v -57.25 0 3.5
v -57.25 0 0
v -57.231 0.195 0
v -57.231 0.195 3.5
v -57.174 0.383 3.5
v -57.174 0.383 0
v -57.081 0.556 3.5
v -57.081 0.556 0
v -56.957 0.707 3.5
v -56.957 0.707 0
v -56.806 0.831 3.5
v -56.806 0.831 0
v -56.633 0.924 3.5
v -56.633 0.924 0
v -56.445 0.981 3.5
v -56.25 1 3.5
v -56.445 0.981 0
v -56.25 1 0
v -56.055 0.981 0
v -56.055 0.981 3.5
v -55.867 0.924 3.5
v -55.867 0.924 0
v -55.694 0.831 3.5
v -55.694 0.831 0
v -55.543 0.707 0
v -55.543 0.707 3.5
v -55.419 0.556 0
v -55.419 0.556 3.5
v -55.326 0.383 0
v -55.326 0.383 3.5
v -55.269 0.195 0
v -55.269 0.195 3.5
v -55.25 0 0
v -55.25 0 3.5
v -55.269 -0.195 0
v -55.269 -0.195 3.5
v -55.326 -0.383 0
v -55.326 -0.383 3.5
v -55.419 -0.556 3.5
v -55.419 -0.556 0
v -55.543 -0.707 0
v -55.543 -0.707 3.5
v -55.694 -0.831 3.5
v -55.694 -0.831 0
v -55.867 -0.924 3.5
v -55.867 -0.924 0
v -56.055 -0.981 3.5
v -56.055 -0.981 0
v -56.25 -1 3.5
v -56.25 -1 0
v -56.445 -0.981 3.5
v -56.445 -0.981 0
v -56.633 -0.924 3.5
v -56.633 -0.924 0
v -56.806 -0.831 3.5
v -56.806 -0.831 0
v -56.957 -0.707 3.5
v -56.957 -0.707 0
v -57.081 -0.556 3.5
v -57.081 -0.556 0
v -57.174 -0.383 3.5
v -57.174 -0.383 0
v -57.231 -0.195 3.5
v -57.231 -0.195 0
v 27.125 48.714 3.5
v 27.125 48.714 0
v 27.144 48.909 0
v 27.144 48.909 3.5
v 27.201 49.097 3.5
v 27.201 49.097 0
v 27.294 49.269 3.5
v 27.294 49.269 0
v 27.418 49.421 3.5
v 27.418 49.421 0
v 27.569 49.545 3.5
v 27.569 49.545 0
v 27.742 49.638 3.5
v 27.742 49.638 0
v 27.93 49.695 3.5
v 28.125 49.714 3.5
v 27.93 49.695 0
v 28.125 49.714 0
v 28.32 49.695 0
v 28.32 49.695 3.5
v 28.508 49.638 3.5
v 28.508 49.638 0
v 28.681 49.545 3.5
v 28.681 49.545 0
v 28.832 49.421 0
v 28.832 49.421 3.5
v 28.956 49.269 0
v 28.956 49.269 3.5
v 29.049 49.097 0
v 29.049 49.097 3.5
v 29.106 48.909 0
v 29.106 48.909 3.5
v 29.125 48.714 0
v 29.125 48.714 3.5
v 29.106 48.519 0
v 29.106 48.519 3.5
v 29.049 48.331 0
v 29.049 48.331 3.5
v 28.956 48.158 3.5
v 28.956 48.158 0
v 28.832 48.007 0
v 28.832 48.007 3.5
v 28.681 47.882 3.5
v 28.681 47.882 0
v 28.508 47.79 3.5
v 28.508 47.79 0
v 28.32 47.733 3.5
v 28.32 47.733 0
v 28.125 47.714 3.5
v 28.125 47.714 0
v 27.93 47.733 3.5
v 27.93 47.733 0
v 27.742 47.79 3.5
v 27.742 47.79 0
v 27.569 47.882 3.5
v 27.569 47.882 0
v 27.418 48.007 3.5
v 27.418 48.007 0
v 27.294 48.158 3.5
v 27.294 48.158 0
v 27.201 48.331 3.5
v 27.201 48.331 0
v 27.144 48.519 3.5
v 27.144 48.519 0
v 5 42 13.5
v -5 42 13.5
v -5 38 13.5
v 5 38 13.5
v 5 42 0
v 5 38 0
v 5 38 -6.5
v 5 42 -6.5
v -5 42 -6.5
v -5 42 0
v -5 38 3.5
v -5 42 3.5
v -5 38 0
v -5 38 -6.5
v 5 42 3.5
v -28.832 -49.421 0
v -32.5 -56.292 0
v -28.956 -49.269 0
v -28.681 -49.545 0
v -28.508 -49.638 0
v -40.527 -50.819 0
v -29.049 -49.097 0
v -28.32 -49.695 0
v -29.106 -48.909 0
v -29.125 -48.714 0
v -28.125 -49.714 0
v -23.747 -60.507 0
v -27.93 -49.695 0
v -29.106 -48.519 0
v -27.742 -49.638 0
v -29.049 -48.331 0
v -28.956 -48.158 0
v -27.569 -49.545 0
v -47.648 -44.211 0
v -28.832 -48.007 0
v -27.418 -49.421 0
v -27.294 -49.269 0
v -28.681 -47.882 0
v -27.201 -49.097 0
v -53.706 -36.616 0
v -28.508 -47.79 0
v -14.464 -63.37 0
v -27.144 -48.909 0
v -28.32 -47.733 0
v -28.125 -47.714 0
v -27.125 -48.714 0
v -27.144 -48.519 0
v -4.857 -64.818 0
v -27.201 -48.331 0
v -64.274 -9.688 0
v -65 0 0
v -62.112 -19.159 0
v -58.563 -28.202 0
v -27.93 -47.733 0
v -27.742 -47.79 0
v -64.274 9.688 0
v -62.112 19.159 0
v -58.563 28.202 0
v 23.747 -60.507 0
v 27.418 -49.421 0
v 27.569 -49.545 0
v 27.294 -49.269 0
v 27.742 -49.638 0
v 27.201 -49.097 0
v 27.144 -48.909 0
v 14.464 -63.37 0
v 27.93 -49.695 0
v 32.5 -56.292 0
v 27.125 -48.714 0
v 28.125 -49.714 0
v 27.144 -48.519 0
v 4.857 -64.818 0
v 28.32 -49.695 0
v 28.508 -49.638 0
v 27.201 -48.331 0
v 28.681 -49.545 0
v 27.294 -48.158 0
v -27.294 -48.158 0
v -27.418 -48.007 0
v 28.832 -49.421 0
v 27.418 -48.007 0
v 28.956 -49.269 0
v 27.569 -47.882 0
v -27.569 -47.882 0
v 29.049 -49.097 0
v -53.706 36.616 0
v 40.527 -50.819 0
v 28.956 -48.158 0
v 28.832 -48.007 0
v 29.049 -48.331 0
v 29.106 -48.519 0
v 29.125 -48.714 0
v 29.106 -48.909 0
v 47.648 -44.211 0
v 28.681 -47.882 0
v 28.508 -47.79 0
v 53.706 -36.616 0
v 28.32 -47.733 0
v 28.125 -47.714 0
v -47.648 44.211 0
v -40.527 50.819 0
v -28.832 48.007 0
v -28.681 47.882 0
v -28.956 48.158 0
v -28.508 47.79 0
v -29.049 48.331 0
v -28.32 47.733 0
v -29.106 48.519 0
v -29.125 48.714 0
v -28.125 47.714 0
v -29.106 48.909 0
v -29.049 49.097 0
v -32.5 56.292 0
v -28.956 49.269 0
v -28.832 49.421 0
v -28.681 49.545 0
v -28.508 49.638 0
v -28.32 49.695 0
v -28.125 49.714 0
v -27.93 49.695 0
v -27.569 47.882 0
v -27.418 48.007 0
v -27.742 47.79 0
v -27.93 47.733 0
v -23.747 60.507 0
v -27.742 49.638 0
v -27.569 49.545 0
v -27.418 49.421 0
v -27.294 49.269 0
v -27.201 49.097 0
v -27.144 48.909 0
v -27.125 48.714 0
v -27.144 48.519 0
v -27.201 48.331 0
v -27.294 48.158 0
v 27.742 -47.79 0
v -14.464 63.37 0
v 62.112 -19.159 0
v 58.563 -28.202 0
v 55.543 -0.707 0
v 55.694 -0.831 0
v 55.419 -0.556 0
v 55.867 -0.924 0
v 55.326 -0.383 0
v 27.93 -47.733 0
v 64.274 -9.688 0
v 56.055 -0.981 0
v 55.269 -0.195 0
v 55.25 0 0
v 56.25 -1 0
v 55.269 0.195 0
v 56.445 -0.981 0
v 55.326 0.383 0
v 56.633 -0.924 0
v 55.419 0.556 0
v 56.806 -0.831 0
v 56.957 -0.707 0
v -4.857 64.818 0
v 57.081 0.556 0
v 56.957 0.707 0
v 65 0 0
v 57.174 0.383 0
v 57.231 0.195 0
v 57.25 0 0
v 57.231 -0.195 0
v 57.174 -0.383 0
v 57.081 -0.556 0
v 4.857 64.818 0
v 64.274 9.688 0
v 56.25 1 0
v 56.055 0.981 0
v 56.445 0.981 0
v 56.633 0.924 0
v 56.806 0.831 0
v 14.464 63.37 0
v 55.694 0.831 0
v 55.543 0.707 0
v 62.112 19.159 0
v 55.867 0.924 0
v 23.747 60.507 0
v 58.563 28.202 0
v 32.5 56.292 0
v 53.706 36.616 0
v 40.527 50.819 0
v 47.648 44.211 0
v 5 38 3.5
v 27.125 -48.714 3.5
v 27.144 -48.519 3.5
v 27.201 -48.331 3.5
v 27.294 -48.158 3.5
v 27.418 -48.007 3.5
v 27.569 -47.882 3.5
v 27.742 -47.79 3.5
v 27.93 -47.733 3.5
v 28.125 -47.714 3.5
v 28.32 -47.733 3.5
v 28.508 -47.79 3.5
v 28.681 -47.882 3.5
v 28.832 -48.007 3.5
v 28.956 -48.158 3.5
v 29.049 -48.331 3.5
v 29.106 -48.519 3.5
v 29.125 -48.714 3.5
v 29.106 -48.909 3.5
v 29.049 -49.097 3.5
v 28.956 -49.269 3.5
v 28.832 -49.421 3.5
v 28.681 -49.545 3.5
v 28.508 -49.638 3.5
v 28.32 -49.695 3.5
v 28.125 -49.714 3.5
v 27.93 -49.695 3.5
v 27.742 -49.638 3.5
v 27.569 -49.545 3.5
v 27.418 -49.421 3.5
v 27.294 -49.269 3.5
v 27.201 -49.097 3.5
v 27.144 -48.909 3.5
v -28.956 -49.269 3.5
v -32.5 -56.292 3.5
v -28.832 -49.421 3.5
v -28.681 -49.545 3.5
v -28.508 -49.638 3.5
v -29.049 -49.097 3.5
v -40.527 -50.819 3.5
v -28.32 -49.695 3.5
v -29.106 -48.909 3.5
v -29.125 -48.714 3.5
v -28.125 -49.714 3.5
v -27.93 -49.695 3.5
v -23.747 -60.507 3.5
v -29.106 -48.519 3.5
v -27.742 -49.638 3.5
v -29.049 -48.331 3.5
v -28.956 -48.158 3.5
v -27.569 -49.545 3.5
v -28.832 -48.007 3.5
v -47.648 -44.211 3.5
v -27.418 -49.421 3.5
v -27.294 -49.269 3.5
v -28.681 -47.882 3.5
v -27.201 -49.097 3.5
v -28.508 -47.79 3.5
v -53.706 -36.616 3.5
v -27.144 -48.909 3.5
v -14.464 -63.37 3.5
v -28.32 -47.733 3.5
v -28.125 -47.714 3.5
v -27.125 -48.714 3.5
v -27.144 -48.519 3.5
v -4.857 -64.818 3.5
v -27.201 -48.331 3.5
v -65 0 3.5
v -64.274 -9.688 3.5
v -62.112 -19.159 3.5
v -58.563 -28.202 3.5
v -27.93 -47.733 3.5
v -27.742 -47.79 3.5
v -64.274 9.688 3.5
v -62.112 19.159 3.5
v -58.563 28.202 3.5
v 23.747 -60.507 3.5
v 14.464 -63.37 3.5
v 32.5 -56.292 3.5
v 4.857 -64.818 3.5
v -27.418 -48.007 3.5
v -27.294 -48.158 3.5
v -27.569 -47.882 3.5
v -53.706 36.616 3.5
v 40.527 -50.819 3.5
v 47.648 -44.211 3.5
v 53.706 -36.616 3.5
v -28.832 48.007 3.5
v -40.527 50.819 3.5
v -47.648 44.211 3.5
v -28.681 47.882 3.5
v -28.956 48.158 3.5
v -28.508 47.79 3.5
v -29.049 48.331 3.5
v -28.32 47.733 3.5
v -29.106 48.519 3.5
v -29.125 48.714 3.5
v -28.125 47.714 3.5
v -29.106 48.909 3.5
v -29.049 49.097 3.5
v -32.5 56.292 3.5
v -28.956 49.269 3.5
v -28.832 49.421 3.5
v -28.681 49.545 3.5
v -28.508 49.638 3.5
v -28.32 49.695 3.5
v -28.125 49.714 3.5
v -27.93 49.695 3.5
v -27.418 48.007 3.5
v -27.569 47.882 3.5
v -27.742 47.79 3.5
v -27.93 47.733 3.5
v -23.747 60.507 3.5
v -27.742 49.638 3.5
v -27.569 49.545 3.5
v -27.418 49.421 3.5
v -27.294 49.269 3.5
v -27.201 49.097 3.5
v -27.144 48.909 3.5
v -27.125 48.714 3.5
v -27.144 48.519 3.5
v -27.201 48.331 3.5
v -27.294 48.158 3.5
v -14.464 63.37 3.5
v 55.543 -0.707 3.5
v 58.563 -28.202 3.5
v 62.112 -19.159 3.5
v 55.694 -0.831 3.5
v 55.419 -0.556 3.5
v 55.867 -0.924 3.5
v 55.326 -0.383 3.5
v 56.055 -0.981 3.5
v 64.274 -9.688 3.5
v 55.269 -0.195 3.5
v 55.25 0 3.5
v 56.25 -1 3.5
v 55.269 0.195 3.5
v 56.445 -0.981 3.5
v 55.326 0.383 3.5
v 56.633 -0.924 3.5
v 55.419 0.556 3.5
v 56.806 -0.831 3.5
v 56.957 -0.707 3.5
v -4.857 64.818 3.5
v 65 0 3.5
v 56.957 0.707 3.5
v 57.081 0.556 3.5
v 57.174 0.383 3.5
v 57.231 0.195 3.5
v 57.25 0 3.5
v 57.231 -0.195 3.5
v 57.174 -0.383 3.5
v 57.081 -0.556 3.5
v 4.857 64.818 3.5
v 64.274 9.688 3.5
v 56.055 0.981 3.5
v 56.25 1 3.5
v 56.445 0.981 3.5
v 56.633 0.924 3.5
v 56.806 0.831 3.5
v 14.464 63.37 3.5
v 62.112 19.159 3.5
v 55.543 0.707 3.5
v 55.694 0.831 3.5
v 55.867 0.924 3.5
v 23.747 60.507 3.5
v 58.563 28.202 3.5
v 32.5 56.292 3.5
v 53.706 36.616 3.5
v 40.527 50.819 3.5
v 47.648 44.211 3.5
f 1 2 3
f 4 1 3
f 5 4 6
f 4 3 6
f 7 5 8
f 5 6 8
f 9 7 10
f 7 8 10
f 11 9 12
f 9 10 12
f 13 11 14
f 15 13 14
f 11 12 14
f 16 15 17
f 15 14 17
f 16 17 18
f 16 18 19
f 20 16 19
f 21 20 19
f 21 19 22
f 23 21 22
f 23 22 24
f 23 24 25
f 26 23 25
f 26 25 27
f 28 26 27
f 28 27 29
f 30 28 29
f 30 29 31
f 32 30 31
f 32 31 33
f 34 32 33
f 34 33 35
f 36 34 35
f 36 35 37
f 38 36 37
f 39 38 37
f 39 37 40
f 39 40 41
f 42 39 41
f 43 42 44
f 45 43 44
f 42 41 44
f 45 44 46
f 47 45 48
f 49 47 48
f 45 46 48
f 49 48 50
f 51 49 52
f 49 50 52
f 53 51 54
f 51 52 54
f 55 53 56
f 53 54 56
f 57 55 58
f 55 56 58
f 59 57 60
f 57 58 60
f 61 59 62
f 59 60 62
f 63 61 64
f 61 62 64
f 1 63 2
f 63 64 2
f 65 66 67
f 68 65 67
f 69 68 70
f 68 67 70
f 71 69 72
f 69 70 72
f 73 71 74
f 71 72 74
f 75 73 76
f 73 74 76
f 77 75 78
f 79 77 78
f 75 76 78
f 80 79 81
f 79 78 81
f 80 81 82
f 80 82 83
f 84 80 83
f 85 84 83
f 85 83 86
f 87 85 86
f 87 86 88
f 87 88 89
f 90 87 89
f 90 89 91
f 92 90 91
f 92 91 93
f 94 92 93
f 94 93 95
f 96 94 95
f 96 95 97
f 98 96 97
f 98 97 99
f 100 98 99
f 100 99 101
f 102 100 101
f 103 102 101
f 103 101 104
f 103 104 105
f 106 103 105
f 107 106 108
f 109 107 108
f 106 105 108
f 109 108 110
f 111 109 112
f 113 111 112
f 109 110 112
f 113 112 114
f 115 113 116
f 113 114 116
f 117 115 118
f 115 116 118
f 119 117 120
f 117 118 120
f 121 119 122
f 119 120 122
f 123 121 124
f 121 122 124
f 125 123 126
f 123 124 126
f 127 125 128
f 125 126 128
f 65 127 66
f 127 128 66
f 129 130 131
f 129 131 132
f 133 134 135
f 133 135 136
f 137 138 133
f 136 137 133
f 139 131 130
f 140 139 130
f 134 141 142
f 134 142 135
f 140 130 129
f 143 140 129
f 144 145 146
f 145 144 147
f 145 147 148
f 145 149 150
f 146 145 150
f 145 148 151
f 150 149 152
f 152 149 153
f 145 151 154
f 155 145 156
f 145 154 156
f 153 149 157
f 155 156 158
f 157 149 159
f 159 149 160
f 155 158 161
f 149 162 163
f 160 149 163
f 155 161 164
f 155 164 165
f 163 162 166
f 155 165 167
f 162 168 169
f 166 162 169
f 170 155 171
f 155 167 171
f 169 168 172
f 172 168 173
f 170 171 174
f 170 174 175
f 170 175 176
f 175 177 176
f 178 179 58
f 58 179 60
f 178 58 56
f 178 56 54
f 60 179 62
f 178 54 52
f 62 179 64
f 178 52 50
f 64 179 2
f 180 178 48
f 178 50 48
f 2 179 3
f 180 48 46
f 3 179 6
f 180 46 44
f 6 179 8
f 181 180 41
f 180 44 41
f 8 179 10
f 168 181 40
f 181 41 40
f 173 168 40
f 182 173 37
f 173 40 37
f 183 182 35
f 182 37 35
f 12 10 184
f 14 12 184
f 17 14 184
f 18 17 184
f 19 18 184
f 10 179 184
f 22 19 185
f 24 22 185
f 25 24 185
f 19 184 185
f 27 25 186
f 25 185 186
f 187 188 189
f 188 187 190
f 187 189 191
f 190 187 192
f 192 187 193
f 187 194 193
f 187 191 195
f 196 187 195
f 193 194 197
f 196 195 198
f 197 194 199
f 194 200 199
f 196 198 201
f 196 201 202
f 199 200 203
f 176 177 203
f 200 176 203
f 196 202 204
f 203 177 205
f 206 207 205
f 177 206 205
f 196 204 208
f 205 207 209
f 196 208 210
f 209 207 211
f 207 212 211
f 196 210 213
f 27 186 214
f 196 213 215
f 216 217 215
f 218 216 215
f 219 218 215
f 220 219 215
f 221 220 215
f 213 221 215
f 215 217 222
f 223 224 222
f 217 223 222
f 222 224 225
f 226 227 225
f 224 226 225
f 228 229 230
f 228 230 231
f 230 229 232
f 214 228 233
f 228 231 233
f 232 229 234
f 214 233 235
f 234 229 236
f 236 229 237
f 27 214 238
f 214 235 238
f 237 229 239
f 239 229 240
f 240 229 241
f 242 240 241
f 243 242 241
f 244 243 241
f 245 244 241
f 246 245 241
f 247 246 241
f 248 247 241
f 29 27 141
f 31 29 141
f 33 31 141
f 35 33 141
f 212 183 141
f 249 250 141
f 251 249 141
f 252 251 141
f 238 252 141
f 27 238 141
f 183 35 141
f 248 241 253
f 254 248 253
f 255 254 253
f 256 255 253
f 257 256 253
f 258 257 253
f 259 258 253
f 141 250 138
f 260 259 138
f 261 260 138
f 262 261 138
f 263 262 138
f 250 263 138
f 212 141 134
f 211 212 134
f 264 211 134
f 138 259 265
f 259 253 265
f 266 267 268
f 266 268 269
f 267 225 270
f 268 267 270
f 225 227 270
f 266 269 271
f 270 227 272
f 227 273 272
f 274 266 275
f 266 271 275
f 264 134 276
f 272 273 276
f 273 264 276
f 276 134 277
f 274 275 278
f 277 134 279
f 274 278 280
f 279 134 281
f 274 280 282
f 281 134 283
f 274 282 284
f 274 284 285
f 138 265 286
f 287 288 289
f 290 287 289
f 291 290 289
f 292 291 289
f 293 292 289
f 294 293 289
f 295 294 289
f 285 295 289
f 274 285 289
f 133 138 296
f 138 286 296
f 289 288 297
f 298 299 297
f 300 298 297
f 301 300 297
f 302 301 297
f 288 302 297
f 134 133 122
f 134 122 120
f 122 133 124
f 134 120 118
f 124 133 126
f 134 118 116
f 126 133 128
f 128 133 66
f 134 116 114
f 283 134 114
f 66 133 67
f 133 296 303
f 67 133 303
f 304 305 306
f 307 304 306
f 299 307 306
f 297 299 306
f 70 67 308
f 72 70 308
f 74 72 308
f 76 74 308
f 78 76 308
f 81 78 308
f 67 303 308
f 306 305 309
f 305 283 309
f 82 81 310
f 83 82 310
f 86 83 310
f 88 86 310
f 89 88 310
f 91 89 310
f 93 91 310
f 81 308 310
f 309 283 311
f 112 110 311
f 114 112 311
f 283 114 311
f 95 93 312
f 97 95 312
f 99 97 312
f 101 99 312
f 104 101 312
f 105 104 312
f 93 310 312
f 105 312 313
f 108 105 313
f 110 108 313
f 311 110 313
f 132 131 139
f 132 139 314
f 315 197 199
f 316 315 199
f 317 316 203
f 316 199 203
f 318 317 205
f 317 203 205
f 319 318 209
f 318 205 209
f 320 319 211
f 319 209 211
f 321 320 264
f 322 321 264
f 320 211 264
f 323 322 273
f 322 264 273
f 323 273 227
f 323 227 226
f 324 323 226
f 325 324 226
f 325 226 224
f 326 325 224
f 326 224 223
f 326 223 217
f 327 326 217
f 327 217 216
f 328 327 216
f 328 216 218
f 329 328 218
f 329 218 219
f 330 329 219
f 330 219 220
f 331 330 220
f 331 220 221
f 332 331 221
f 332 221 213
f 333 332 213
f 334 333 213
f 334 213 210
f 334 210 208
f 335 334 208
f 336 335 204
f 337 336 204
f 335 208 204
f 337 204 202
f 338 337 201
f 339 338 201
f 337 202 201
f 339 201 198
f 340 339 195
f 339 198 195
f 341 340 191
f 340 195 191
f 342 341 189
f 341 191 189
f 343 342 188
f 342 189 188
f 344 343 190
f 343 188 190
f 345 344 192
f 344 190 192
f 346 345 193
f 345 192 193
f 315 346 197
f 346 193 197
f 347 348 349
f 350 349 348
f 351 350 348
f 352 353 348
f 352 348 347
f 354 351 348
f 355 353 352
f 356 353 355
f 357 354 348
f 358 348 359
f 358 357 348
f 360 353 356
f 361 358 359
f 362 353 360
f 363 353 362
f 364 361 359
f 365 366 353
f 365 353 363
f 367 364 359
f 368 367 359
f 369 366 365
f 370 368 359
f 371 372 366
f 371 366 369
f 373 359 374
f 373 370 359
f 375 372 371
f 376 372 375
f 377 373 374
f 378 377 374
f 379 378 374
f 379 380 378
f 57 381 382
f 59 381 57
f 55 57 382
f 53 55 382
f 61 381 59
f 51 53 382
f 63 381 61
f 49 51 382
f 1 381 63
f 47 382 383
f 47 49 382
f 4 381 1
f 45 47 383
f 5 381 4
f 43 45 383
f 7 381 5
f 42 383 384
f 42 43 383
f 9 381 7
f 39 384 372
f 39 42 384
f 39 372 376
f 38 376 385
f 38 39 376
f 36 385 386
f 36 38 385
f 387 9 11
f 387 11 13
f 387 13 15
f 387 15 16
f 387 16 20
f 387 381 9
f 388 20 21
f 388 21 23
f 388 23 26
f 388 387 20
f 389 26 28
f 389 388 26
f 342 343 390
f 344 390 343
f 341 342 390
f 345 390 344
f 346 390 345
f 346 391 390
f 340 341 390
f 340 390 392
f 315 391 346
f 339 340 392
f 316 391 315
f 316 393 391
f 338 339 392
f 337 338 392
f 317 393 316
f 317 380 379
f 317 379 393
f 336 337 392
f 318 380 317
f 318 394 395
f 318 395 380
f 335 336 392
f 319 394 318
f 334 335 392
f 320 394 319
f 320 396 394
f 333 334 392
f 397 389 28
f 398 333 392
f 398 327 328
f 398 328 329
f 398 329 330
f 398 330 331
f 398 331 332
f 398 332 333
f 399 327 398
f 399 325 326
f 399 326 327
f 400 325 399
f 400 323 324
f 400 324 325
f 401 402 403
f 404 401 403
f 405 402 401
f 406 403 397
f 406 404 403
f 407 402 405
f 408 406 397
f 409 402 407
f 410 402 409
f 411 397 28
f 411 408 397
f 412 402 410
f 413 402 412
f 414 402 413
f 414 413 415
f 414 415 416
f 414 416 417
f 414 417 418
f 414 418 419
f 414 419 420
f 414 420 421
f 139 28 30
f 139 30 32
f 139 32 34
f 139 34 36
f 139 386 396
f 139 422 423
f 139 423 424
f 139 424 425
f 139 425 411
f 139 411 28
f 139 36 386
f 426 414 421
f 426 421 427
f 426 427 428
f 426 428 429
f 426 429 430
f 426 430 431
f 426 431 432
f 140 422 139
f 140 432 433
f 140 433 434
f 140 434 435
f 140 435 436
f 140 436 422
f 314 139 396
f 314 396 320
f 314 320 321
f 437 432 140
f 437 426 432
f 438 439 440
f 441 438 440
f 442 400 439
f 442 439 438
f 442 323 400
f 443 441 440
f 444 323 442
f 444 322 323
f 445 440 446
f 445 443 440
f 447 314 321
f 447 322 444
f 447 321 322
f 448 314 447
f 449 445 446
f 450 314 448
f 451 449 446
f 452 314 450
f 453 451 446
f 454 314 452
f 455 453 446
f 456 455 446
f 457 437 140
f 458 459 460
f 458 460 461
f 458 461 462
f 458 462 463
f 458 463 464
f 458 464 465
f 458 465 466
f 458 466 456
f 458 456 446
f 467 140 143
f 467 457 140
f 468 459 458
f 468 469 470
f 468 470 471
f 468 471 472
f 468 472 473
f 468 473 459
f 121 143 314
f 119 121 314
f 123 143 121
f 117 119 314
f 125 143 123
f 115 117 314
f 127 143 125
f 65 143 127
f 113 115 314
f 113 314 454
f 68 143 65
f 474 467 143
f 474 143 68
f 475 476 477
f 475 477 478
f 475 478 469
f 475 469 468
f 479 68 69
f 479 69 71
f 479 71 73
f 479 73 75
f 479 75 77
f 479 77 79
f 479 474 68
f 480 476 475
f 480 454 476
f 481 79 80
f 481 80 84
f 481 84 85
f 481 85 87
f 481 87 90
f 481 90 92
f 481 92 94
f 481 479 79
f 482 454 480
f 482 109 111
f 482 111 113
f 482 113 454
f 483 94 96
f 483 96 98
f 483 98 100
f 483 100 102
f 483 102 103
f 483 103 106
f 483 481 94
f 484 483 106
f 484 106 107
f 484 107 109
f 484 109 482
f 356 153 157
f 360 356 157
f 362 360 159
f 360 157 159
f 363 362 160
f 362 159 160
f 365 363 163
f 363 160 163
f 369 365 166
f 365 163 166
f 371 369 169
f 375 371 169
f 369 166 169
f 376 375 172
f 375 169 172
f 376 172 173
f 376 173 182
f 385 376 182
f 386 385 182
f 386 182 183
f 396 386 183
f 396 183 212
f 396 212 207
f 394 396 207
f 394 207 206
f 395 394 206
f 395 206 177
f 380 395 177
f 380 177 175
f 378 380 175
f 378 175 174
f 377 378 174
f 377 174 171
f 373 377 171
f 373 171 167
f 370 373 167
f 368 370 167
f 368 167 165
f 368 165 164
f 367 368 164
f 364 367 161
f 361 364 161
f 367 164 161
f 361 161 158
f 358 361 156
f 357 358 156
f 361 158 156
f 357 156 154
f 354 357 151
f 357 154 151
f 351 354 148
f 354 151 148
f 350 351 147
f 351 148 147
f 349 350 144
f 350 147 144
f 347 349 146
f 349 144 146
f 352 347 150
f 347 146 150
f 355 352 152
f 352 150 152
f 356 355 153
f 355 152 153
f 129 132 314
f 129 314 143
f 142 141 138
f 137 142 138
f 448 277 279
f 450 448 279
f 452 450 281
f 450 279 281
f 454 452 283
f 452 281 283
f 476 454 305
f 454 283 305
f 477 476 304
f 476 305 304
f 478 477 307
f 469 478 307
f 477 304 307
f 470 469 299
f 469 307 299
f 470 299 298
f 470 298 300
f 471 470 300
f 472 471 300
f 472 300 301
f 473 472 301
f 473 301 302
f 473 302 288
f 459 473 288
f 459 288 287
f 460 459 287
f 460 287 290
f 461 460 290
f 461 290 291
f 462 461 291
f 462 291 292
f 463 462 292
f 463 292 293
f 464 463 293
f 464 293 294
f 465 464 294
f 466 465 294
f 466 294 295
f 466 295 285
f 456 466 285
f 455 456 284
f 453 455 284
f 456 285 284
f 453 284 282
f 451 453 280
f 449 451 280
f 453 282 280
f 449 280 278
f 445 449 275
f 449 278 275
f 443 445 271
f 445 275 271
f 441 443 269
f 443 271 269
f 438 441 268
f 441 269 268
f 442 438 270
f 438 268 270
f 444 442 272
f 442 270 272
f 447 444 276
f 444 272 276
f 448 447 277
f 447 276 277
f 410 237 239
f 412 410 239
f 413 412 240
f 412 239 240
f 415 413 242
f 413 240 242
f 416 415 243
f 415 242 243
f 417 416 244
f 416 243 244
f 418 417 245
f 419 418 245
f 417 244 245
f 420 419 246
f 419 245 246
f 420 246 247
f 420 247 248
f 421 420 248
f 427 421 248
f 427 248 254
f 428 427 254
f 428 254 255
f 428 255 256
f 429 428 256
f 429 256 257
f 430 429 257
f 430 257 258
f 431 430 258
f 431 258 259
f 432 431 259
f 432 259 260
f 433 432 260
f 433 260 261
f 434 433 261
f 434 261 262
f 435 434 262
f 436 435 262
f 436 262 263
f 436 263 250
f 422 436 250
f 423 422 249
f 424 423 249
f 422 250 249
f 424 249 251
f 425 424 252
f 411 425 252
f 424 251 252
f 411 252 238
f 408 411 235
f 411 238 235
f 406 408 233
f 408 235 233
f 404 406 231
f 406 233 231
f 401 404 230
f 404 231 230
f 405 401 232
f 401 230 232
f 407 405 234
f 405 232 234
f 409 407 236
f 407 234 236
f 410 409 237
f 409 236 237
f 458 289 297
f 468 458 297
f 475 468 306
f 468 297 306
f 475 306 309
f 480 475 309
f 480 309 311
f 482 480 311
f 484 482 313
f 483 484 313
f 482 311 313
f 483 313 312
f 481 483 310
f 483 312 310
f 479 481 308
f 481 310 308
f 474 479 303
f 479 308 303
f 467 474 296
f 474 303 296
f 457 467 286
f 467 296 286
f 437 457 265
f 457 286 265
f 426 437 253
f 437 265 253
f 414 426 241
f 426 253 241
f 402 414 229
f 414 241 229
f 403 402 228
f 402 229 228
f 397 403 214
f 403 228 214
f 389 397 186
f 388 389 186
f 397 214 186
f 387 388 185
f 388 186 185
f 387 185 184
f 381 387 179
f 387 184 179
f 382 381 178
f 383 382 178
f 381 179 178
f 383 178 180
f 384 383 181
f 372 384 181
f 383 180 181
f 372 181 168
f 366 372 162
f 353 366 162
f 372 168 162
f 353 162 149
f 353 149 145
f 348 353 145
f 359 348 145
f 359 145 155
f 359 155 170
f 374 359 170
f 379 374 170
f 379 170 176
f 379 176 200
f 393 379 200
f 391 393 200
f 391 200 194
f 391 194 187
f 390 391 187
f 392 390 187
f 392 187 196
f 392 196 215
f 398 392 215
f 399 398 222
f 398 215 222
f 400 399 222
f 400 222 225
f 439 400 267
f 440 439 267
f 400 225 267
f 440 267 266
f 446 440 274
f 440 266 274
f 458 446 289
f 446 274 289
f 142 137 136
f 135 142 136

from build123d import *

# Parameters (mm, degrees)
SKETCH_1_R          = 65
EXTRUDE_1_DEPTH     = 3.5
SKETCH_2_W          = 10
SKETCH_2_H          = 4
EXTRUDE_2_DEPTH     = 10
SKETCH_3_R          = 1
CUT_EXTRUDE_1_DEPTH = 10


with BuildPart() as part:
    # 草图1 → 凸台-拉伸1 (new body)
    with BuildSketch(Plane.XY):
        Circle(SKETCH_1_R)
    extrude(amount=EXTRUDE_1_DEPTH)

    # 草图2 → 凸台-拉伸2 (add, symmetric)
    with BuildSketch(Plane.XY.offset(3.5)):
        with Locations((0, 40)):
            Rectangle(SKETCH_2_W, SKETCH_2_H)
    extrude(amount=EXTRUDE_2_DEPTH, both=True)

    # 草图3 → 切除-拉伸1 (cut)
    with BuildSketch(Plane(origin=(0, 0, 0), x_dir=(-1, 0, 0), z_dir=(0, 0, -1))):
        with Locations((56.25, 0)):
            Circle(SKETCH_3_R)
        with Locations((28.125, -48.713928963)):
            Circle(SKETCH_3_R)
        with Locations((-28.125, -48.713928963)):
            Circle(SKETCH_3_R)
        with Locations((-56.25, 0)):
            Circle(SKETCH_3_R)
        with Locations((-28.125, 48.713928963)):
            Circle(SKETCH_3_R)
        with Locations((28.125, 48.713928963)):
            Circle(SKETCH_3_R)
    extrude(amount=-CUT_EXTRUDE_1_DEPTH, mode=Mode.SUBTRACT)


solid = part.part
